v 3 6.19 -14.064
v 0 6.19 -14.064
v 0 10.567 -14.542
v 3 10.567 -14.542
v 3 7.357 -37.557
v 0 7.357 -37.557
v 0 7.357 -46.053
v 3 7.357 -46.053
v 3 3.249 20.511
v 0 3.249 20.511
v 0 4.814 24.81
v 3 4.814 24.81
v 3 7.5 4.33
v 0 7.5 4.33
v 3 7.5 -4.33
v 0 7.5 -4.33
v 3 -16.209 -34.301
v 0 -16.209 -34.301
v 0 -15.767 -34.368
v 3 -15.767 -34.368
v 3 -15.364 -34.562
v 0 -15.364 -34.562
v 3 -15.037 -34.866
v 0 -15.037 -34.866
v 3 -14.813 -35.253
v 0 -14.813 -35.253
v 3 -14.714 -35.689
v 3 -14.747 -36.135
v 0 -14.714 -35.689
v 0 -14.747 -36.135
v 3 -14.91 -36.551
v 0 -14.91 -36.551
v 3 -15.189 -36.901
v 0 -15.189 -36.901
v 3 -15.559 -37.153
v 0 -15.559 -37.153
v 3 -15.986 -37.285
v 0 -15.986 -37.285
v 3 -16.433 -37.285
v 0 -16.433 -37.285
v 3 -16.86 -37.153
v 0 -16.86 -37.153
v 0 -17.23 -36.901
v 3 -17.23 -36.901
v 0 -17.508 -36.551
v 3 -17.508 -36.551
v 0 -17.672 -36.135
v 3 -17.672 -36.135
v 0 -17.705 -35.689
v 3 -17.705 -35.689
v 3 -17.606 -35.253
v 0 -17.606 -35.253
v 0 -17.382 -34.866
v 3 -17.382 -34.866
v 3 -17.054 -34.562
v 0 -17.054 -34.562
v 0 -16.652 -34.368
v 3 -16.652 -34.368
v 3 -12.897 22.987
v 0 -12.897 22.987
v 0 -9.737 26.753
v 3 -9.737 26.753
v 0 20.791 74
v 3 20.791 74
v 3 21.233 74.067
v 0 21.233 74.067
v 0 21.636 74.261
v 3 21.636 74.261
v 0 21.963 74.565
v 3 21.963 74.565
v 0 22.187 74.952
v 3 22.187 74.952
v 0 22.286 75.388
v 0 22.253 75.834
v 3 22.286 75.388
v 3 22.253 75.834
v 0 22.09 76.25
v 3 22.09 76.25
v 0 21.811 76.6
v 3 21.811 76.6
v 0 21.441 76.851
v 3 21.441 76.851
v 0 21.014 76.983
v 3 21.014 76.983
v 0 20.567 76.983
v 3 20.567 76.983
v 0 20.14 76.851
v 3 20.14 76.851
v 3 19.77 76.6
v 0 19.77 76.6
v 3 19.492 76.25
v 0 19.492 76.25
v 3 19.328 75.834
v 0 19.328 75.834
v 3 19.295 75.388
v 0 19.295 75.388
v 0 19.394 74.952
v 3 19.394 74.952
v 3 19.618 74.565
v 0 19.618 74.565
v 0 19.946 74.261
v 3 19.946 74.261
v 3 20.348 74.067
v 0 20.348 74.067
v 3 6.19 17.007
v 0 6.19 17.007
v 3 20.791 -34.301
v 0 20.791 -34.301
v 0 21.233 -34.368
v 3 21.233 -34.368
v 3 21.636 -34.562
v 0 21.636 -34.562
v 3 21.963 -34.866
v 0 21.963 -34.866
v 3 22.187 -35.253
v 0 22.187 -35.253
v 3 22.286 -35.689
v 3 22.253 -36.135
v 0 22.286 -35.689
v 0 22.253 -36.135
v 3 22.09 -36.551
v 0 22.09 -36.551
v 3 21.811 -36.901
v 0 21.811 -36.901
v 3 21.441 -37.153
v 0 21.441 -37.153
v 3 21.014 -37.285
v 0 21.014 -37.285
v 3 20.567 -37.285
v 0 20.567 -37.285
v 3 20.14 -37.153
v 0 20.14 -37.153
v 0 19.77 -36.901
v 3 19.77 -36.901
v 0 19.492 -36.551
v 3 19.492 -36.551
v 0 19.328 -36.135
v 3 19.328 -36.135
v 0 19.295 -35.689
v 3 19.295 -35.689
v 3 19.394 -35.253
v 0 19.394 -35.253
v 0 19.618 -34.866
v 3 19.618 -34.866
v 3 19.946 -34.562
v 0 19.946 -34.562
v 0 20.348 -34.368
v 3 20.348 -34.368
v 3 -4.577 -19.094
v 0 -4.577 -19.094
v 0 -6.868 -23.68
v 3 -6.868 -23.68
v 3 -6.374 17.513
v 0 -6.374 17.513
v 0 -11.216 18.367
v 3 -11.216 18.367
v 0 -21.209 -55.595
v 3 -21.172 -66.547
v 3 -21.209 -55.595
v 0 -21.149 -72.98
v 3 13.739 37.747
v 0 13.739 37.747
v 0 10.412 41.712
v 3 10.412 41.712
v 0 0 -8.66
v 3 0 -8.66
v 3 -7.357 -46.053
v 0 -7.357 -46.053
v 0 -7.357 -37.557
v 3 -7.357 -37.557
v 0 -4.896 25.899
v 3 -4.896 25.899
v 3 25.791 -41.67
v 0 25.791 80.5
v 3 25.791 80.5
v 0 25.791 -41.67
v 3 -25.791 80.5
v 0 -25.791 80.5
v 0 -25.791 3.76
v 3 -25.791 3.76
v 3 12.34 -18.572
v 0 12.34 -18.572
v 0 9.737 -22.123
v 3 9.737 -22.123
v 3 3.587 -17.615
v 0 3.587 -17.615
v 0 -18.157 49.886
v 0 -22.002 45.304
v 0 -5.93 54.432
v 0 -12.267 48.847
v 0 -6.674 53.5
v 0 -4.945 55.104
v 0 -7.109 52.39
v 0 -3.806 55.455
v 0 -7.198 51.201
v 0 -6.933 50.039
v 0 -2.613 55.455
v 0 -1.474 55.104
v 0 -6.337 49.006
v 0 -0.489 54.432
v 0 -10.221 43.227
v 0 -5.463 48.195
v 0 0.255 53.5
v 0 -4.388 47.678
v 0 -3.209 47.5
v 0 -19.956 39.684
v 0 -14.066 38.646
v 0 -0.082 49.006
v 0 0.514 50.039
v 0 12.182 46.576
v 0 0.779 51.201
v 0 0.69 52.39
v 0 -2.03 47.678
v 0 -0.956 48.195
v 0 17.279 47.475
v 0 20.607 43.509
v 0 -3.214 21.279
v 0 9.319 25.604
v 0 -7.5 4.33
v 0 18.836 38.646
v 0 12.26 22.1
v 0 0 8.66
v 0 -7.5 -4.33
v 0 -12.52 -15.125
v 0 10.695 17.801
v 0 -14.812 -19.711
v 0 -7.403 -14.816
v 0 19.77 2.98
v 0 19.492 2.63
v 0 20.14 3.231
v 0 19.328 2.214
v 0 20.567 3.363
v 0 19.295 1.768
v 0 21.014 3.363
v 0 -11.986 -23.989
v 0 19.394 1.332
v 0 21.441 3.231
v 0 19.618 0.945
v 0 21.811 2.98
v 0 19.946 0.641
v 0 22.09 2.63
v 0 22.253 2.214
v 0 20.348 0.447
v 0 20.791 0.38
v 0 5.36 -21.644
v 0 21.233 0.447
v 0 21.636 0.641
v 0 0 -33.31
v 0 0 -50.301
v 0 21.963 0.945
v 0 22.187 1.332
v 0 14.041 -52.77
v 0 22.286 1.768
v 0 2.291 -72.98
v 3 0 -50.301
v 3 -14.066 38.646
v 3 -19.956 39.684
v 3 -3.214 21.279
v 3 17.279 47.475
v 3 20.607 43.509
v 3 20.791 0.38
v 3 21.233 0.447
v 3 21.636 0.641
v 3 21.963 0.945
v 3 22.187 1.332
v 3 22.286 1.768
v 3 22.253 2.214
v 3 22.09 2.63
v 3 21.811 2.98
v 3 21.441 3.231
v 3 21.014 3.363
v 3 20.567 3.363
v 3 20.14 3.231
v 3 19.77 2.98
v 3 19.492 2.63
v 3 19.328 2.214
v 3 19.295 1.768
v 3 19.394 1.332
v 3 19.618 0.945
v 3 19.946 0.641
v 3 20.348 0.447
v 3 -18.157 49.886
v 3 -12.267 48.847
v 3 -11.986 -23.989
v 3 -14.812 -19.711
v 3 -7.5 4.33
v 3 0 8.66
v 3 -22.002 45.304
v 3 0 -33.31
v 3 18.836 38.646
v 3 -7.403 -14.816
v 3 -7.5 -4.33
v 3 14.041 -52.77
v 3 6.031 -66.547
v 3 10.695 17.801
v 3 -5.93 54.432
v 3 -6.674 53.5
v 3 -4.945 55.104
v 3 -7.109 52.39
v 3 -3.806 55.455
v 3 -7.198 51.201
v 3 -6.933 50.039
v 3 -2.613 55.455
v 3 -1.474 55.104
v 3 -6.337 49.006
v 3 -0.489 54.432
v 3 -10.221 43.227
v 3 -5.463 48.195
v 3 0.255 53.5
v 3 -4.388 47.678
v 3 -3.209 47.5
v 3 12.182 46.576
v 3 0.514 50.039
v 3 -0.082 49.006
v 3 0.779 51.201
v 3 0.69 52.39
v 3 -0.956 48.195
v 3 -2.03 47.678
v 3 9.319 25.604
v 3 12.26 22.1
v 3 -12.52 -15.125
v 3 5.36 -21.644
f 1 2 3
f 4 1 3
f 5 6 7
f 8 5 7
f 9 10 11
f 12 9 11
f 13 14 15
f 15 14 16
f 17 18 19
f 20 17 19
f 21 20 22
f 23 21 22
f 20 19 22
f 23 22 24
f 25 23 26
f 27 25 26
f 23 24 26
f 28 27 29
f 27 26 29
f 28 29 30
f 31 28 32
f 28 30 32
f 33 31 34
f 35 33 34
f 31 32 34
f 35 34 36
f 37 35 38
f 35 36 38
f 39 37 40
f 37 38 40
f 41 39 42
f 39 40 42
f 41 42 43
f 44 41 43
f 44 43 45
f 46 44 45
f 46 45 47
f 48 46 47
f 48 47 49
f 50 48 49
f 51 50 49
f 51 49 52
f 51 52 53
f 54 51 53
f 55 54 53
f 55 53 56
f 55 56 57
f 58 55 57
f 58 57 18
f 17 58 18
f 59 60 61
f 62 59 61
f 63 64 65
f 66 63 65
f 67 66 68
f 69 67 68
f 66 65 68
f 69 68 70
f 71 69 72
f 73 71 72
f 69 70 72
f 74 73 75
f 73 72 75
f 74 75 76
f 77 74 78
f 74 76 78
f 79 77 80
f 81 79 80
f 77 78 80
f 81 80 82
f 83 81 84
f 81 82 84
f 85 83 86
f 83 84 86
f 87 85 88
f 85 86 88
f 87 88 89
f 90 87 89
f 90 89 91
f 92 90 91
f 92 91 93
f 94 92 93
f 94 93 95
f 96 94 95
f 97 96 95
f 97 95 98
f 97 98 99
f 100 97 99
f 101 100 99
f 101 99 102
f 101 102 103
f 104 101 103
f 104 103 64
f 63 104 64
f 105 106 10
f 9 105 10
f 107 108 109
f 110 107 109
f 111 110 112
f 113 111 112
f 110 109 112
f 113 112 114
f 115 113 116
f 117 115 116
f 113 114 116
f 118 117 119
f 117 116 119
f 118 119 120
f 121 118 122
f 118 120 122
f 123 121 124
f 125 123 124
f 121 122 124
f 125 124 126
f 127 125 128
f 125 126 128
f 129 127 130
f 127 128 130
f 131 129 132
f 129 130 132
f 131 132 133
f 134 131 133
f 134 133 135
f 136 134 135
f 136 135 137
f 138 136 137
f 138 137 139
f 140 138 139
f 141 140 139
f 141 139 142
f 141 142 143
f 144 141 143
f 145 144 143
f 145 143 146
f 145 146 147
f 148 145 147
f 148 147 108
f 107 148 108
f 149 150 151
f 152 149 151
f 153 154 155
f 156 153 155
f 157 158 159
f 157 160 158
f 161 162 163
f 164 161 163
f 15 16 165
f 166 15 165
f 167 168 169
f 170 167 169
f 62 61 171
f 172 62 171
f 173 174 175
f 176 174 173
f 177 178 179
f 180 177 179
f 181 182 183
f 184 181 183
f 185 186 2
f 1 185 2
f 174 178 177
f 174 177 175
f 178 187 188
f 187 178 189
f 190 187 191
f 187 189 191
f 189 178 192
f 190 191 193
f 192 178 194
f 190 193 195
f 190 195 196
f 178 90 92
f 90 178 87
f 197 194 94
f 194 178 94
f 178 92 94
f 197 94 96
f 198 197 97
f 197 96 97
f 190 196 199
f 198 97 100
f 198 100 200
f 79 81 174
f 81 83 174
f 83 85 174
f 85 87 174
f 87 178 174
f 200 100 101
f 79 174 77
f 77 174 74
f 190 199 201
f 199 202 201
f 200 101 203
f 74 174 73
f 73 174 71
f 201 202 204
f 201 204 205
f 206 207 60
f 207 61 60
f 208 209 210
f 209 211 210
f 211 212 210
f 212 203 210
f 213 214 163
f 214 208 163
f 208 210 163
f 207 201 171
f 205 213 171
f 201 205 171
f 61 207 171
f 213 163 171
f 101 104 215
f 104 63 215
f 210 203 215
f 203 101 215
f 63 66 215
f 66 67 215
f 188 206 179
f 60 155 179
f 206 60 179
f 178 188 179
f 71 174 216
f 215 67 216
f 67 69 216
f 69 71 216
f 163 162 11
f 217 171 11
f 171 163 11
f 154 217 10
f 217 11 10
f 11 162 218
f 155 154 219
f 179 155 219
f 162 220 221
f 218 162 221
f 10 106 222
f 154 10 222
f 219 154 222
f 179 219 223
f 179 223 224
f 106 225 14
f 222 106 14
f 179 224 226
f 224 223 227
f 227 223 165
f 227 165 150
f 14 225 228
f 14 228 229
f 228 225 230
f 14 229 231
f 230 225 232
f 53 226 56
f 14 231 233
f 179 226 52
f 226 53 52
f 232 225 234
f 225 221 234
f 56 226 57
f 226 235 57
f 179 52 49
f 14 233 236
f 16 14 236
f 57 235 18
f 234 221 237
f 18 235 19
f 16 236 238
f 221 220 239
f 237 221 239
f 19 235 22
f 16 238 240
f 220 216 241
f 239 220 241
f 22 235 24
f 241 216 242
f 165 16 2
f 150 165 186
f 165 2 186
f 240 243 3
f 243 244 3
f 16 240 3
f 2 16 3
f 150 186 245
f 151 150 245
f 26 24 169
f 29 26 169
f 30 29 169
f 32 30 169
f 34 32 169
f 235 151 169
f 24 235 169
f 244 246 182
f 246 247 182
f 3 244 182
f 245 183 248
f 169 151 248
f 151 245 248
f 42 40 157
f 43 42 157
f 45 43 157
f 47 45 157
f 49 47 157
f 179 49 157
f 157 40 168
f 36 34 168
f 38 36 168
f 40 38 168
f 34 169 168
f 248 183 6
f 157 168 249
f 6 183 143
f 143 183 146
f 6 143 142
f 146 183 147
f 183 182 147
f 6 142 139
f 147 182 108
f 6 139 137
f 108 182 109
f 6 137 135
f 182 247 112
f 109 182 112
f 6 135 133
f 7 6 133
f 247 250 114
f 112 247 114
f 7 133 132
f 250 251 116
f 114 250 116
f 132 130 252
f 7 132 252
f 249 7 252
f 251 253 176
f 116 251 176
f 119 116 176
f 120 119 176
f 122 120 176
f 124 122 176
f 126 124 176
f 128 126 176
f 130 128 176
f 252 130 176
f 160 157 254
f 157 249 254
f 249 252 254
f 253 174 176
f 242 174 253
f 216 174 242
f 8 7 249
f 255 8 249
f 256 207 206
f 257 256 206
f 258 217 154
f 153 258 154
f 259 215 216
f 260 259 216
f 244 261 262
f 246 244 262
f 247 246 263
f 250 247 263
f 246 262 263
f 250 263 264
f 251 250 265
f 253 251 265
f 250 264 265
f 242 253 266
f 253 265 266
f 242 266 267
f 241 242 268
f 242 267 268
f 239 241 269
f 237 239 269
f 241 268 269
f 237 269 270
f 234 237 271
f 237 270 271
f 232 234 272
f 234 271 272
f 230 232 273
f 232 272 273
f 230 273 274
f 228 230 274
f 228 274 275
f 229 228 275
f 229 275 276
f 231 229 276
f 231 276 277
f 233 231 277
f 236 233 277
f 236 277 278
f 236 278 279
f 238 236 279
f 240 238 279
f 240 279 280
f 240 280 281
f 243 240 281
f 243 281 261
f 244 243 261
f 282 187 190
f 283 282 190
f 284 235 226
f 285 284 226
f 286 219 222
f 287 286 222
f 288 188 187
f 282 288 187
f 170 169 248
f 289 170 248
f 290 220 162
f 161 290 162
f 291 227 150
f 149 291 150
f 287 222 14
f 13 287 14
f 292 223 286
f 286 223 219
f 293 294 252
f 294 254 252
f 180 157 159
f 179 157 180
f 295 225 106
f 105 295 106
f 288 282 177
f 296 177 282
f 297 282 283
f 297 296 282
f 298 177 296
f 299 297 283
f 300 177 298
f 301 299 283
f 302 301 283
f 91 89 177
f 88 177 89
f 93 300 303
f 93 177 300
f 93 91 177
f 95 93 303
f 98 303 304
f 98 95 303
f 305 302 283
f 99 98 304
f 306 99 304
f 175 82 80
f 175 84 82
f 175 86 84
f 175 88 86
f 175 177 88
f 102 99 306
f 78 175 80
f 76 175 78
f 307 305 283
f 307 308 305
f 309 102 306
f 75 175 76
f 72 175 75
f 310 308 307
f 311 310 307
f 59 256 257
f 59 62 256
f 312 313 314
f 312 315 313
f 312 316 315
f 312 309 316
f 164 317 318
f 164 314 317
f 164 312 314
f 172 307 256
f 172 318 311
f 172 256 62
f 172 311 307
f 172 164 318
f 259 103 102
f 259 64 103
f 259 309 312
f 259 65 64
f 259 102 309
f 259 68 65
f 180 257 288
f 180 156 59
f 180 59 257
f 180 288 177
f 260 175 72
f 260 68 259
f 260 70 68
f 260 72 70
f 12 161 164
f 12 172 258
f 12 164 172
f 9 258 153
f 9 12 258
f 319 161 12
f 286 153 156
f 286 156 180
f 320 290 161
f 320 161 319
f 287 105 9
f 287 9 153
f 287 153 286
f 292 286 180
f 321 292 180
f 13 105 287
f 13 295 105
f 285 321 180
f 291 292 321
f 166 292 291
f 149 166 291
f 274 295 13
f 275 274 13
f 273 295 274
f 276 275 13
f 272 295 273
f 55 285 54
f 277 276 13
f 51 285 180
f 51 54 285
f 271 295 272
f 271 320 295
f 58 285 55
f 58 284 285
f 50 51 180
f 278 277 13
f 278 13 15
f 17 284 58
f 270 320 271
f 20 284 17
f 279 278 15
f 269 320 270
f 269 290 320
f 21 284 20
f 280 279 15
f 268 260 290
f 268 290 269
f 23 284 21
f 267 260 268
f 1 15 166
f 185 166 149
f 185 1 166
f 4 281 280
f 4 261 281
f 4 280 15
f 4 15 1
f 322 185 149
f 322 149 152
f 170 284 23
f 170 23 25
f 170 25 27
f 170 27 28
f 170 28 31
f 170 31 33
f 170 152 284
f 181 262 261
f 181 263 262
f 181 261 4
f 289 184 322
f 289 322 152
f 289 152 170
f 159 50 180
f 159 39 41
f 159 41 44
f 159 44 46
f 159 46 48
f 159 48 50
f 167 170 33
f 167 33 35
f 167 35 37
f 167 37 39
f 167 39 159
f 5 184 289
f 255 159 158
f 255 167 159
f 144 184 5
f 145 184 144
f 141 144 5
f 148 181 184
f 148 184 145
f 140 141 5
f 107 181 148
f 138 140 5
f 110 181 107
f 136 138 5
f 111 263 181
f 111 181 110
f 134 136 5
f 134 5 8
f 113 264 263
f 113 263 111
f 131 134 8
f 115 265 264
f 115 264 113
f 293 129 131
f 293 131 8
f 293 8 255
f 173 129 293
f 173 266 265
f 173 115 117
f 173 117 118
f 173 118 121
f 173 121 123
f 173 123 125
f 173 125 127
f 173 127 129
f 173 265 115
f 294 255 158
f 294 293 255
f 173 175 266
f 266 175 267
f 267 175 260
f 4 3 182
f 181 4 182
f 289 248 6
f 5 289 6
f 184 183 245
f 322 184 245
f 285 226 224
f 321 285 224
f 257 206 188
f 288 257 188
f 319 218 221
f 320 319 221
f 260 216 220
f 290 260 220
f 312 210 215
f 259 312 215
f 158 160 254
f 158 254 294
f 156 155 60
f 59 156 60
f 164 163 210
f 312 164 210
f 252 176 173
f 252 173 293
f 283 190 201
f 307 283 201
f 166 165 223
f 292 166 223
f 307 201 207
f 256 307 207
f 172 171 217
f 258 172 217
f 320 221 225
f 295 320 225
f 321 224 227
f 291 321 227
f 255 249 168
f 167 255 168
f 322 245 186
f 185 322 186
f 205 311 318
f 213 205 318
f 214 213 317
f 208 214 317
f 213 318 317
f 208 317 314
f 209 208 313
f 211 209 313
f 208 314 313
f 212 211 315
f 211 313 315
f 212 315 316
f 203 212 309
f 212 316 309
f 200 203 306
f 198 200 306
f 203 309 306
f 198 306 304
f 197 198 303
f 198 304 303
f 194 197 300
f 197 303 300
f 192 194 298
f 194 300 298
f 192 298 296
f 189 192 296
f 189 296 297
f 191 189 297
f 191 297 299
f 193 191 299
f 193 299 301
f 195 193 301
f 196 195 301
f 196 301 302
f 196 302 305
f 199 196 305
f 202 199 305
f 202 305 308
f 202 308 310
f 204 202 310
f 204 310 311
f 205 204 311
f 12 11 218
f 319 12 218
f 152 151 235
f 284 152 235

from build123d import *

# Parameters (mm, degrees)
CROQUIS1_W              = 161
CROQUIS1_H              = 51.5812
SALIENTE_EXTRUIR1_DEPTH = 3
CORTAR_EXTRUIR1_REACH   = 5
CROQUIS2_R              = 1.5
CROQUIS2_R_2            = 4
CORTAR_EXTRUIR2_REACH   = 5
CROQUIS3_R              = 1.5
CORTAR_EXTRUIR3_REACH   = 53.581
CORTAR_EXTRUIR4_REACH   = 5
CORTAR_EXTRUIR5_REACH   = 5
CORTAR_EXTRUIR6_REACH   = 5
CORTAR_EXTRUIR7_REACH   = 5
CORTAR_EXTRUIR8_REACH   = 5
CROQUIS9_R              = 1.5


with BuildPart() as part:
    # Croquis1 → Saliente-Extruir1 (new body)
    with BuildSketch(Plane(origin=(0, 0, 0), x_dir=(0, 0, -1), z_dir=(1, 0, 0))):
        Rectangle(CROQUIS1_W, CROQUIS1_H)
    extrude(amount=SALIENTE_EXTRUIR1_DEPTH)

    # Croquis2 → Cortar-Extruir1 (cut, up to next)
    with BuildSketch(Plane(origin=(3, 0, 0), x_dir=(0, 0, -1), z_dir=(1, 0, 0)), mode=Mode.PRIVATE) as cortar_extruir1_sk1:
        with Locations((-75.5, 20.7906)):
            Circle(CROQUIS2_R)
    cortar_extruir1_tool1 = extrude(cortar_extruir1_sk1.sketch, amount=-CORTAR_EXTRUIR1_REACH, mode=Mode.PRIVATE) & part.part
    add(cortar_extruir1_tool1.solids().sort_by_distance((3, 20.7906, 75.5))[0], mode=Mode.SUBTRACT)
    # Croquis2 → Cortar-Extruir1 (cut, up to next)
    with BuildSketch(Plane(origin=(3, 0, 0), x_dir=(0, 0, -1), z_dir=(1, 0, 0)), mode=Mode.PRIVATE) as cortar_extruir1_sk2:
        with Locations((-1.88, 20.7906)):
            Circle(CROQUIS2_R)
    cortar_extruir1_tool2 = extrude(cortar_extruir1_sk2.sketch, amount=-CORTAR_EXTRUIR1_REACH, mode=Mode.PRIVATE) & part.part
    add(cortar_extruir1_tool2.solids().sort_by_distance((3, 20.7906, 1.88))[0], mode=Mode.SUBTRACT)
    # Croquis2 → Cortar-Extruir1 (cut, up to next)
    with BuildSketch(Plane(origin=(3, 0, 0), x_dir=(0, 0, -1), z_dir=(1, 0, 0)), mode=Mode.PRIVATE) as cortar_extruir1_sk3:
        with Locations((-51.5, -3.2094)):
            Circle(CROQUIS2_R_2)
    cortar_extruir1_tool3 = extrude(cortar_extruir1_sk3.sketch, amount=-CORTAR_EXTRUIR1_REACH, mode=Mode.PRIVATE) & part.part
    add(cortar_extruir1_tool3.solids().sort_by_distance((3, -3.2094, 51.5))[0], mode=Mode.SUBTRACT)

    # Croquis3 → Cortar-Extruir2 (cut, up to next)
    with BuildSketch(Plane.ZY, mode=Mode.PRIVATE) as cortar_extruir2_sk1:
        with Locations((-35.801477372, -16.2094)):
            Circle(CROQUIS3_R)
    cortar_extruir2_tool1 = extrude(cortar_extruir2_sk1.sketch, amount=-CORTAR_EXTRUIR2_REACH, mode=Mode.PRIVATE) & part.part
    add(cortar_extruir2_tool1.solids().sort_by_distance((0, -16.2094, -35.801477))[0], mode=Mode.SUBTRACT)

    # Croquis4 → Cortar-Extruir3 (cut, up to next)
    with BuildSketch(Plane(origin=(0, 25.7906, 0), x_dir=(1, 0, 0), z_dir=(0, 1, 0)), mode=Mode.PRIVATE) as cortar_extruir3_sk1:
        Polygon((3, 80.5), (0, 80.5), (0, 72.980420108), (3, 66.546899347), align=None)
    cortar_extruir3_tool1 = extrude(cortar_extruir3_sk1.sketch, amount=-CORTAR_EXTRUIR3_REACH, mode=Mode.PRIVATE) & part.part
    add(cortar_extruir3_tool1.solids().sort_by_distance((1.649807, 25.7906, -74.971199))[0], mode=Mode.SUBTRACT)

    # Croquis5 → Cortar-Extruir4 (cut, up to next)
    with BuildSketch(Plane.ZY, mode=Mode.PRIVATE) as cortar_extruir4_sk1:
        Polygon((-72.980420108, -25.7906), (-72.980420108, -21.149469815), (-55.595458212, -21.2094), (3.759789946, -25.7906), align=None)
    cortar_extruir4_tool1 = extrude(cortar_extruir4_sk1.sketch, amount=-CORTAR_EXTRUIR4_REACH, mode=Mode.PRIVATE) & part.part
    add(cortar_extruir4_tool1.solids().sort_by_distance((0, -23.974753, -46.380283))[0], mode=Mode.SUBTRACT)

    # Croquis6 → Cortar-Extruir5 (cut, up to next)
    with BuildSketch(Plane.ZY, mode=Mode.PRIVATE) as cortar_extruir5_sk1:
        Polygon((-72.980420108, 25.7906), (-72.980420108, 2.2906), (-52.770420108, 14.0406), (-52.770420108, 25.7906), align=None)
    cortar_extruir5_tool1 = extrude(cortar_extruir5_sk1.sketch, amount=-CORTAR_EXTRUIR5_REACH, mode=Mode.PRIVATE) & part.part
    add(cortar_extruir5_tool1.solids().sort_by_distance((0, 16.651711, -63.998198))[0], mode=Mode.SUBTRACT)

    # Croquis7 → Cortar-Extruir6 (cut, up to next)
    with BuildSketch(Plane.ZY, mode=Mode.PRIVATE) as cortar_extruir6_sk1:
        Polygon((-52.770420108, 25.7906), (-41.670420108, 25.7906), (-52.770420108, 14.0406), align=None)
    cortar_extruir6_tool1 = extrude(cortar_extruir6_sk1.sketch, amount=-CORTAR_EXTRUIR6_REACH, mode=Mode.PRIVATE) & part.part
    add(cortar_extruir6_tool1.solids().sort_by_distance((0, 21.873933, -49.07042))[0], mode=Mode.SUBTRACT)

    # Croquis8 → Cortar-Extruir7 (cut, up to next)
    with BuildSketch(Plane.ZY, mode=Mode.PRIVATE) as cortar_extruir7_sk1:
        Polygon((8.660254038, 0), (4.330127019, 7.5), (-4.330127019, 7.5), (-8.660254038, 0), (-4.330127019, -7.5), (4.330127019, -7.5), align=None)
    cortar_extruir7_tool1 = extrude(cortar_extruir7_sk1.sketch, amount=-CORTAR_EXTRUIR7_REACH, mode=Mode.PRIVATE) & part.part
    add(cortar_extruir7_tool1.solids().sort_by_distance((0, 0, 0))[0], mode=Mode.SUBTRACT)
    # Croquis8 → Cortar-Extruir7 (cut, up to next)
    with BuildSketch(Plane.ZY, mode=Mode.PRIVATE) as cortar_extruir7_sk2:
        Polygon((25.604154883, 9.319150251), (22.099721379, 12.259719112), (17.800897292, 10.695075102), (17.006506709, 6.189862231), (20.510940213, 3.24929337), (24.8097643, 4.81393738), align=None)
    cortar_extruir7_tool2 = extrude(cortar_extruir7_sk2.sketch, amount=-CORTAR_EXTRUIR7_REACH, mode=Mode.PRIVATE) & part.part
    add(cortar_extruir7_tool2.solids().sort_by_distance((0, 7.754506, 21.305331))[0], mode=Mode.SUBTRACT)
    # Croquis8 → Cortar-Extruir7 (cut, up to next)
    with BuildSketch(Plane.ZY, mode=Mode.PRIVATE) as cortar_extruir7_sk3:
        Polygon((-23.988727728, -11.985830273), (-19.711232592, -14.811812276), (-15.125112818, -12.520383825), (-14.816488181, -7.402973371), (-19.093983317, -4.576991368), (-23.68010309, -6.868419819), align=None)
    cortar_extruir7_tool3 = extrude(cortar_extruir7_sk3.sketch, amount=-CORTAR_EXTRUIR7_REACH, mode=Mode.PRIVATE) & part.part
    add(cortar_extruir7_tool3.solids().sort_by_distance((0, -9.694402, -19.402608))[0], mode=Mode.SUBTRACT)
    # Croquis8 → Cortar-Extruir7 (cut, up to next)
    with BuildSketch(Plane.ZY, mode=Mode.PRIVATE) as cortar_extruir7_sk4:
        Polygon((-22.123245507, 9.737186974), (-21.644369238, 5.360424201), (-17.614543355, 3.58676183), (-14.063593742, 6.189862231), (-14.542470011, 10.566625004), (-18.572295894, 12.340287376), align=None)
    cortar_extruir7_tool4 = extrude(cortar_extruir7_sk4.sketch, amount=-CORTAR_EXTRUIR7_REACH, mode=Mode.PRIVATE) & part.part
    add(cortar_extruir7_tool4.solids().sort_by_distance((0, 7.963525, -18.09342))[0], mode=Mode.SUBTRACT)
    # Croquis8 → Cortar-Extruir7 (cut, up to next)
    with BuildSketch(Plane.ZY, mode=Mode.PRIVATE) as cortar_extruir7_sk5:
        Polygon((26.752701341, -9.737186974), (25.898994771, -4.895576423), (21.279183753, -3.214102725), (17.513079305, -6.374239578), (18.366785876, -11.215850129), (22.986596894, -12.897323827), align=None)
    cortar_extruir7_tool5 = extrude(cortar_extruir7_sk5.sketch, amount=-CORTAR_EXTRUIR7_REACH, mode=Mode.PRIVATE) & part.part
    add(cortar_extruir7_tool5.solids().sort_by_distance((0, -8.055713, 22.13289))[0], mode=Mode.SUBTRACT)
    # Croquis8 → Cortar-Extruir7 (cut, up to next)
    with BuildSketch(Plane.ZY, mode=Mode.PRIVATE) as cortar_extruir7_sk6:
        Polygon((-50.300771297, 0), (-46.052967767, -7.357411534), (-37.557360708, -7.357411534), (-33.309557178, 0), (-37.557360708, 7.357411534), (-46.052967767, 7.357411534), align=None)
    cortar_extruir7_tool6 = extrude(cortar_extruir7_sk6.sketch, amount=-CORTAR_EXTRUIR7_REACH, mode=Mode.PRIVATE) & part.part
    add(cortar_extruir7_tool6.solids().sort_by_distance((0, 0, -41.805164))[0], mode=Mode.SUBTRACT)
    # Croquis8 → Cortar-Extruir7 (cut, up to next)
    with BuildSketch(Plane.ZY, mode=Mode.PRIVATE) as cortar_extruir7_sk7:
        Polygon((37.746685044, 13.738669798), (41.711835056, 10.411513886), (46.575811604, 12.18185657), (47.474638141, 17.279355166), (43.509488129, 20.606511078), (38.645511581, 18.836168394), align=None)
    cortar_extruir7_tool7 = extrude(cortar_extruir7_sk7.sketch, amount=-CORTAR_EXTRUIR7_REACH, mode=Mode.PRIVATE) & part.part
    add(cortar_extruir7_tool7.solids().sort_by_distance((0, 15.509012, 42.610662))[0], mode=Mode.SUBTRACT)
    # Croquis8 → Cortar-Extruir7 (cut, up to next)
    with BuildSketch(Plane.ZY, mode=Mode.PRIVATE) as cortar_extruir7_sk8:
        Polygon((38.645511581, -14.065815903), (39.684095326, -19.955917015), (45.304364392, -22.001527663), (49.886049713, -18.157037201), (48.847465968, -12.266936089), (43.227196902, -10.221325441), align=None)
    cortar_extruir7_tool8 = extrude(cortar_extruir7_sk8.sketch, amount=-CORTAR_EXTRUIR7_REACH, mode=Mode.PRIVATE) & part.part
    add(cortar_extruir7_tool8.solids().sort_by_distance((0, -16.111427, 44.265781))[0], mode=Mode.SUBTRACT)

    # Croquis9 → Cortar-Extruir8 (cut, up to next)
    with BuildSketch(Plane.ZY, mode=Mode.PRIVATE) as cortar_extruir8_sk1:
        with Locations((-35.801477372, 20.7906)):
            Circle(CROQUIS9_R)
    cortar_extruir8_tool1 = extrude(cortar_extruir8_sk1.sketch, amount=-CORTAR_EXTRUIR8_REACH, mode=Mode.PRIVATE) & part.part
    add(cortar_extruir8_tool1.solids().sort_by_distance((0, 20.7906, -35.801477))[0], mode=Mode.SUBTRACT)


solid = part.part
